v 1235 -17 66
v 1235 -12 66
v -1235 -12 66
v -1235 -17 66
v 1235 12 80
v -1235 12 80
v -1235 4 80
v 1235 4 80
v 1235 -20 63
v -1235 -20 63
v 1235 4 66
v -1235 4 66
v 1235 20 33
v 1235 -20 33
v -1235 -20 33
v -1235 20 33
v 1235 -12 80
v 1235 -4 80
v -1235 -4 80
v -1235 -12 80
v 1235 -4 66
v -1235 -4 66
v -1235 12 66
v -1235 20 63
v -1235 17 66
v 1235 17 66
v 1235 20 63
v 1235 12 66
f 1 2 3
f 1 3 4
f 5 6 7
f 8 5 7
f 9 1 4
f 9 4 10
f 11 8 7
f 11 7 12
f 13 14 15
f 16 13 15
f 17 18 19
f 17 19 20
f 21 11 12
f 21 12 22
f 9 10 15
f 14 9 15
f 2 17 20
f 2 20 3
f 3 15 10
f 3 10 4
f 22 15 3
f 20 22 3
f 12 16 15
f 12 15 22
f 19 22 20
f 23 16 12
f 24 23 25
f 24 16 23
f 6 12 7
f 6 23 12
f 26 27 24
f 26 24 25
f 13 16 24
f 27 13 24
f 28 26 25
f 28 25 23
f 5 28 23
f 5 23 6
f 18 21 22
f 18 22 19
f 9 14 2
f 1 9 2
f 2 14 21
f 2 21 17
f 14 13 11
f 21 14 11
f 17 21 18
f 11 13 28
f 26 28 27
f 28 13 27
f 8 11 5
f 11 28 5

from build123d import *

# Parameters (mm, degrees)
F1_W     = 40
F1_H     = 19
F3_DEPTH = 1275
F2_W     = 80
F2_H     = 100
F4_DEPTH = 25
F6_DEPTH = 40


with BuildPart() as f3:
    # F1 (on Right) → F3 (new body, symmetric)
    with BuildSketch(Plane.YZ):
        Polygon((20, 33), (20, 63), (17, 66), (12, 66), (12, 80), (4, 80), (4, 66), (-4, 66), (-4, 80), (-12, 80), (-12, 66), (-17, 66), (-20, 63), (-20, 33), align=None)
        with Locations((0, 23.5)):
            Rectangle(F1_W, F1_H)
    extrude(amount=F3_DEPTH, both=True)

    # F2 (on Front) → F4 (cut, symmetric)
    with BuildSketch(Plane.XZ):
        with Locations((-1275, 83)):
            Rectangle(F2_W, F2_H)
        with Locations((-1275, -83)):
            Rectangle(F2_W, F2_H)
        with Locations((1275, 83)):
            Rectangle(F2_W, F2_H)
        with Locations((1275, -83)):
            Rectangle(F2_W, F2_H)
    extrude(amount=F4_DEPTH, both=True, mode=Mode.SUBTRACT)

    # F5 (on face) → F6 (cut, through all)
    with BuildSketch(Plane.XZ.offset(20)):
        Polygon((-1235, 33), (-1275, 33), (-1275, 14), (1275, 14), (1275, 33), (1235, 33), align=None)
    extrude(amount=-F6_DEPTH, mode=Mode.SUBTRACT)


solid = f3.part
